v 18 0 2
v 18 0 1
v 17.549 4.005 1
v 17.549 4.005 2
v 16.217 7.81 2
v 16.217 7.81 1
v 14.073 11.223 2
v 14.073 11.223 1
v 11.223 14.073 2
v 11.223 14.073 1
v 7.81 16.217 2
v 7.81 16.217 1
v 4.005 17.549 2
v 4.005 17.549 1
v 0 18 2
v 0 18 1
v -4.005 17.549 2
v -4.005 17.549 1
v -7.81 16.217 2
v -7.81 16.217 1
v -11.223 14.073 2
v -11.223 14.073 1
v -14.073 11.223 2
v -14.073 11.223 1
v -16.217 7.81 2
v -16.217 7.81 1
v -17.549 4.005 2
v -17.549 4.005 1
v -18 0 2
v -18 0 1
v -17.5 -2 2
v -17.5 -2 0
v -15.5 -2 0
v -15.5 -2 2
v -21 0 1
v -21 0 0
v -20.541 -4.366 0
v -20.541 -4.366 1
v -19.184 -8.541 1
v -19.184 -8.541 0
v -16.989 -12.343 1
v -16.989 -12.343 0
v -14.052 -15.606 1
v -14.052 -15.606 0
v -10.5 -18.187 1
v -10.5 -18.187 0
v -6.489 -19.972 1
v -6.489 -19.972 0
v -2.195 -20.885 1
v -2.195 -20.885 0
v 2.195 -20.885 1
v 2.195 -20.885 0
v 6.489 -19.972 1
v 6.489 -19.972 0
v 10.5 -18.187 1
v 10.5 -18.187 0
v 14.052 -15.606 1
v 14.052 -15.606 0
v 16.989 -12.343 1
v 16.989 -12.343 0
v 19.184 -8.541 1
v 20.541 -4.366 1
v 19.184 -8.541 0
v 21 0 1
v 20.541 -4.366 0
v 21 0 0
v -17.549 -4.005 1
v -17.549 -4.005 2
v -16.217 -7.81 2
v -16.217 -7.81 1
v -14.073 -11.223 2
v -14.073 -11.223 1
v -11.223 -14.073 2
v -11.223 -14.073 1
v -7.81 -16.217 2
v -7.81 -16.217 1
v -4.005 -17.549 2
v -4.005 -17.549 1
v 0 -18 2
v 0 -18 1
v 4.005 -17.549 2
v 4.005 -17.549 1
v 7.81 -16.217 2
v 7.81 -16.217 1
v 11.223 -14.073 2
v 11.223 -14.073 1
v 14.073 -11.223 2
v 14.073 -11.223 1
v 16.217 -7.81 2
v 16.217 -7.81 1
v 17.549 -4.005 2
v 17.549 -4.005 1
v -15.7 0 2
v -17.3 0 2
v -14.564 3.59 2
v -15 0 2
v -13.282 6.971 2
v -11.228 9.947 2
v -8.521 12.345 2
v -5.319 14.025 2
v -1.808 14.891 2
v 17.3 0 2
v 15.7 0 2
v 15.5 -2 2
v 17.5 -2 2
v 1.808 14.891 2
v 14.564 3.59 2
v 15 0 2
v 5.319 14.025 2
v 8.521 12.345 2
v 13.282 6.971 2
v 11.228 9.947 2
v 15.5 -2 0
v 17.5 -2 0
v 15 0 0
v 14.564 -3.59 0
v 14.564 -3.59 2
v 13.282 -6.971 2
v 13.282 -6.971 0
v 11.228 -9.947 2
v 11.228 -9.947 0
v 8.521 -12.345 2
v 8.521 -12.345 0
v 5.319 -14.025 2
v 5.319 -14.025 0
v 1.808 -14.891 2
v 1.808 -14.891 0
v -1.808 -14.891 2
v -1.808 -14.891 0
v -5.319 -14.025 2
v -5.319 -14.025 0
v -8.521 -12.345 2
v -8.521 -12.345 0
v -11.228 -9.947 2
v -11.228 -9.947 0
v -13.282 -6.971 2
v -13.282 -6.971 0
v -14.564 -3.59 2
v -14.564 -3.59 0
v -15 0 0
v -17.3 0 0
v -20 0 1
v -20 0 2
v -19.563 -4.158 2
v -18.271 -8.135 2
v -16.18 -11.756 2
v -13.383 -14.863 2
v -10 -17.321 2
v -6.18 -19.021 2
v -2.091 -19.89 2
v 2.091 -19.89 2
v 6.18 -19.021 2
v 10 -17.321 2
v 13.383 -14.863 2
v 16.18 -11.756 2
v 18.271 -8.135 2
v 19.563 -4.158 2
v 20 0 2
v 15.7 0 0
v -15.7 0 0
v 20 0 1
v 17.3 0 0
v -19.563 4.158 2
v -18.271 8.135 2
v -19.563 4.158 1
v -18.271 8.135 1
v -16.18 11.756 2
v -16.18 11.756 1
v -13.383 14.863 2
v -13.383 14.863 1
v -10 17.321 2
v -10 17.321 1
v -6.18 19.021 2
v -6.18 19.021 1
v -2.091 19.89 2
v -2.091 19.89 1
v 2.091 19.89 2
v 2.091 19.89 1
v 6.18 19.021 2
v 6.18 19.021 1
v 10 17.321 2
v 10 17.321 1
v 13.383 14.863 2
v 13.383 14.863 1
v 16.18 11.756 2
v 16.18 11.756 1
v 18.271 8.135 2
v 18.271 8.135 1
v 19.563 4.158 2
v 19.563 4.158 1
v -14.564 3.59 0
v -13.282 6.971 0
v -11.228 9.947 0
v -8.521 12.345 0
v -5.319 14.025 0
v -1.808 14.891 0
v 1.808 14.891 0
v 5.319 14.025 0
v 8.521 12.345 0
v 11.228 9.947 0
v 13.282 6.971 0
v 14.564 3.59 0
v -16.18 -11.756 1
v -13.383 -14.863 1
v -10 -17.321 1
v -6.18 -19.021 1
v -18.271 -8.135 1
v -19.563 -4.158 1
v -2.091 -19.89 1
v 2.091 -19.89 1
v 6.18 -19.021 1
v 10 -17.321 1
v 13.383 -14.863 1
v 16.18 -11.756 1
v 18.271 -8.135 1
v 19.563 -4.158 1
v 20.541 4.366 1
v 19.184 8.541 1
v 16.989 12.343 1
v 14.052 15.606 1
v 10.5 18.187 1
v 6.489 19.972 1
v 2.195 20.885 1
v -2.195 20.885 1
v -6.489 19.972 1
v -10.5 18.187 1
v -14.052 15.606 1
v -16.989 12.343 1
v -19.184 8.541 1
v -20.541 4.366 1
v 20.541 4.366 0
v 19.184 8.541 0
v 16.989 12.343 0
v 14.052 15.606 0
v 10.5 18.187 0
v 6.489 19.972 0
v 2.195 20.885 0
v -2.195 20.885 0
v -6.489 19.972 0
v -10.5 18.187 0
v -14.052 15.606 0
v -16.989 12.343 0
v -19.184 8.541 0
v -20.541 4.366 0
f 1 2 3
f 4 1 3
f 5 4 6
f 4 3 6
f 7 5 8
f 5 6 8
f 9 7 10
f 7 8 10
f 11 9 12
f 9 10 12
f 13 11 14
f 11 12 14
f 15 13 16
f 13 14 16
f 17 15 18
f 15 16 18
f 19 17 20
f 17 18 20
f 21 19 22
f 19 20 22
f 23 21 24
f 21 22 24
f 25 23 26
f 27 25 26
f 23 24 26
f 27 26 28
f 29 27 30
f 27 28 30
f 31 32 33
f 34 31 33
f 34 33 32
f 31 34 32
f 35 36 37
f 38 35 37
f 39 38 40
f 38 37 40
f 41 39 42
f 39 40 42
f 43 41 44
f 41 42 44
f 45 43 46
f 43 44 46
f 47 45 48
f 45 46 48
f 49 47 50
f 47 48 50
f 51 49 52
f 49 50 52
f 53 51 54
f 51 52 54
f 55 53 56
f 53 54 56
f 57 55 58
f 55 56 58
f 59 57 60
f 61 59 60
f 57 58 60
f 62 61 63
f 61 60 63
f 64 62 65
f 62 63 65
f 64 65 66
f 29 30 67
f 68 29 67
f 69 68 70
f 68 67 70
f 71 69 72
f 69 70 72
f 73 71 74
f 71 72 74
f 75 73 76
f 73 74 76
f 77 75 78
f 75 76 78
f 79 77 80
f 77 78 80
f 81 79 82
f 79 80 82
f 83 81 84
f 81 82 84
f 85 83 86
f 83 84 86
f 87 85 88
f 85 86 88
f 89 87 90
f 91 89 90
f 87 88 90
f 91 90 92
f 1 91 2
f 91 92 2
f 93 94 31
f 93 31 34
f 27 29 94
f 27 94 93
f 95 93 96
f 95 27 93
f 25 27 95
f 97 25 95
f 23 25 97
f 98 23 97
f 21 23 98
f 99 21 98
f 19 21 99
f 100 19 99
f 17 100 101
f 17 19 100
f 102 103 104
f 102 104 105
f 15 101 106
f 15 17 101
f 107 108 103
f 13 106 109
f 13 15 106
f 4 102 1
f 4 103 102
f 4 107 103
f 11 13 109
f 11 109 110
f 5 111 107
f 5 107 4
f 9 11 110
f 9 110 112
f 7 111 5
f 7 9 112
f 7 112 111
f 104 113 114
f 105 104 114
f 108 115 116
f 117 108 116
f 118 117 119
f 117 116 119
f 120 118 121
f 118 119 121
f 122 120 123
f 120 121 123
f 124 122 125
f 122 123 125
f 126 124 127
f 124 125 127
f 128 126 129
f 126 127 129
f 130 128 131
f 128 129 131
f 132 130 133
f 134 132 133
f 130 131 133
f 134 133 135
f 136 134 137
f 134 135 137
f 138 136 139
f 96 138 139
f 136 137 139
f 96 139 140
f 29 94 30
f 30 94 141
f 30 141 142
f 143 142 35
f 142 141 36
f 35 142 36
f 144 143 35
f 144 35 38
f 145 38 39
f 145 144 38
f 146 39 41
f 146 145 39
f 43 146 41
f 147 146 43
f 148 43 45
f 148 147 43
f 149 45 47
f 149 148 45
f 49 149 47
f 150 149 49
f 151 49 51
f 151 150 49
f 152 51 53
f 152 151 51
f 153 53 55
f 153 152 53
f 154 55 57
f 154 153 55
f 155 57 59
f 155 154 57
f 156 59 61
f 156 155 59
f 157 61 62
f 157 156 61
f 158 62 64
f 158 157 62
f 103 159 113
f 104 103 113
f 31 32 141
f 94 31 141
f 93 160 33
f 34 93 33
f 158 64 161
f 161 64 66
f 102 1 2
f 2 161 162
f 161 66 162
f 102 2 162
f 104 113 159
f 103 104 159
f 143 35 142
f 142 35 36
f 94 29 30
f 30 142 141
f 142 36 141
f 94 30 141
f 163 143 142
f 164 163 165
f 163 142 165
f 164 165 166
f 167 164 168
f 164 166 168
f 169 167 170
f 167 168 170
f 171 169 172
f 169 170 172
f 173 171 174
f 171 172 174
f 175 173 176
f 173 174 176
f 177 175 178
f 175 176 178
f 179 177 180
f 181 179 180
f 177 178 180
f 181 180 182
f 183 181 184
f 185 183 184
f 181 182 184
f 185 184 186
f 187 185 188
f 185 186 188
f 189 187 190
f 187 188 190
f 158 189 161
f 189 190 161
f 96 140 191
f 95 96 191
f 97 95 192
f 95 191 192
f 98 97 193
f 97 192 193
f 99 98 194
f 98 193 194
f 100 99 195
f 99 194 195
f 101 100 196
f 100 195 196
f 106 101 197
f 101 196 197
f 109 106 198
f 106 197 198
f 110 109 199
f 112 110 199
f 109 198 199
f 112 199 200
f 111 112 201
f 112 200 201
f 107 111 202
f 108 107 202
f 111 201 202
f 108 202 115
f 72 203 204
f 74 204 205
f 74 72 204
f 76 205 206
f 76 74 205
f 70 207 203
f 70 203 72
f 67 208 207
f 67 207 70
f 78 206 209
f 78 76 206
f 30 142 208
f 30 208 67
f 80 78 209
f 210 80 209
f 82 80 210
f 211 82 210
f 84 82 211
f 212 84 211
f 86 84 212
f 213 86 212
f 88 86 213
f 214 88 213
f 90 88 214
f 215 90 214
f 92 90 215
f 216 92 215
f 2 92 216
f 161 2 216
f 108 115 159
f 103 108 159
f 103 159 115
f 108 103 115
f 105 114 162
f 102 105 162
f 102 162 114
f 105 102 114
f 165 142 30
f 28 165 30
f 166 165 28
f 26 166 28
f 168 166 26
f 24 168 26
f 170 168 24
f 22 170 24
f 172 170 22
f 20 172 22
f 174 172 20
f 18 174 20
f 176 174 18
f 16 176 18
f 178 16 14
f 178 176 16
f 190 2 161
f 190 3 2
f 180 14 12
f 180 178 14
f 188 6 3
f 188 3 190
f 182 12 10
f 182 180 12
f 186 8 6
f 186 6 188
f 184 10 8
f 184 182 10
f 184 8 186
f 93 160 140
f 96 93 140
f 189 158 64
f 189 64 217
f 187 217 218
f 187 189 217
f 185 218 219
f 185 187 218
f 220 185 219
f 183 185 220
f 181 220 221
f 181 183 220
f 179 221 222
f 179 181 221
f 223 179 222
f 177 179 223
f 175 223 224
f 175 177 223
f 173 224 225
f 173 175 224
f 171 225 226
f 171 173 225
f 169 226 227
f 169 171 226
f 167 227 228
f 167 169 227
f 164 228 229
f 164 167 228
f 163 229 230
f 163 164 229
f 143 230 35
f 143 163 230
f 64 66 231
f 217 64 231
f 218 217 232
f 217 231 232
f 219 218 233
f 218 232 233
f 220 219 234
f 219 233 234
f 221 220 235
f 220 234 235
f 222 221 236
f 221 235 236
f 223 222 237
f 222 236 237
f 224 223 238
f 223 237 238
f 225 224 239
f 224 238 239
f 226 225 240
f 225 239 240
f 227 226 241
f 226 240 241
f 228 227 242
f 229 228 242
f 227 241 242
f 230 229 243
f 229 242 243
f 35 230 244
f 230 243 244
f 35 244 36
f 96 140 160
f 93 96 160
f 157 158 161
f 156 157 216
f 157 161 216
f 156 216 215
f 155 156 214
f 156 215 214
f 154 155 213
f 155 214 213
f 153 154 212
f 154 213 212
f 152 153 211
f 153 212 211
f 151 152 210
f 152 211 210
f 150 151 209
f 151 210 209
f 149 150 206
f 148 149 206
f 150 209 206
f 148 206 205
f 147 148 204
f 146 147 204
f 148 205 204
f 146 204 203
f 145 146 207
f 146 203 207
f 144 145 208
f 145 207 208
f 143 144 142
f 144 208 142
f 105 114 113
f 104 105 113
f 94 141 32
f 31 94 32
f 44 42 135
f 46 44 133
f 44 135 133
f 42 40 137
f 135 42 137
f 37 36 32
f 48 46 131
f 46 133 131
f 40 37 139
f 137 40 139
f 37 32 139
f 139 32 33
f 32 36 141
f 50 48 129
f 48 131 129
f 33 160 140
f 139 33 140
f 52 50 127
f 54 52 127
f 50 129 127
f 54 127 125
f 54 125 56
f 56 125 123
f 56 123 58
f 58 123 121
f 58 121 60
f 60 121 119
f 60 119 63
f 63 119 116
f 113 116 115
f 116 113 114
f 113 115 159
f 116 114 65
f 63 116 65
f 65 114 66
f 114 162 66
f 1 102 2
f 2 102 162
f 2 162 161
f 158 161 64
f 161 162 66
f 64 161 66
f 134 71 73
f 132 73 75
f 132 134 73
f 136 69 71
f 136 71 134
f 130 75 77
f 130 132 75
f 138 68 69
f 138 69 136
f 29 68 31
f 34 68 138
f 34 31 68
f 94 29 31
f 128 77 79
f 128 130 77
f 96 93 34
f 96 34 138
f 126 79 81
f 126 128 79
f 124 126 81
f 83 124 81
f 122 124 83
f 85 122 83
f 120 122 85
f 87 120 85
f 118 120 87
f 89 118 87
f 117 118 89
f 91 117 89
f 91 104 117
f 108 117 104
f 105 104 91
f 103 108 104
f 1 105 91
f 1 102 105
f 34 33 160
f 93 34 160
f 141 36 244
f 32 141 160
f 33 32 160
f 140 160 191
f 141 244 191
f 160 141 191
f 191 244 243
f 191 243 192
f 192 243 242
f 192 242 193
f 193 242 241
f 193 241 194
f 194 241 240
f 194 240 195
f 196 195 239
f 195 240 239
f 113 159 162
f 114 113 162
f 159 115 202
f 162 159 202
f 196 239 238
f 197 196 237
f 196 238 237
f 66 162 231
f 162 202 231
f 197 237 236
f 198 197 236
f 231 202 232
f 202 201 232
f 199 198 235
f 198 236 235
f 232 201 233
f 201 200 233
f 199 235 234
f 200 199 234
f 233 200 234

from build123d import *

# Parameters (mm, degrees)
F1_DEPTH  = 2
F2_DEPTH  = 1
F3_DEPTH  = 2
F4_DEPTH  = 2
F5_DEPTH  = 1
F6_DEPTH  = 2
F7_SIZE   = 0.99999
F7_2_SIZE = 0.99999


# Not quite as in the source:
# - a fillet or chamfer is up to 0.001 mm smaller than in the source, because OpenCascade refuses the exact size


with BuildPart() as f1:
    # F0 (on Top) → F1 (new body)
    with BuildSketch(Plane.XY):
        with BuildLine():
            Line((20, 0), (21, 0))
            ThreePointArc((21, 0), (0, 21), (-21, 0))
            Line((-21, 0), (-20, 0))
            ThreePointArc((-20, 0), (0, 20), (20, 0))
        make_face()
    extrude(amount=F1_DEPTH)

    # F0 (on Top) → F2 (join)
    with BuildSketch(Plane.XY):
        with BuildLine():
            Line((18, 0), (20, 0))
            ThreePointArc((20, 0), (0, 20), (-20, 0))
            Line((-20, 0), (-18, 0))
            ThreePointArc((-18, 0), (0, 18), (18, 0))
        make_face()
    extrude(amount=F2_DEPTH)

    # F0 (on Top) → F3 (join)
    with BuildSketch(Plane.XY):
        with BuildLine():
            Line((17.3, 0), (18, 0))
            ThreePointArc((18, 0), (0, 18), (-18, 0))
            Line((-18, 0), (-17.3, 0))
            Line((-17.3, 0), (-17.5, -2))
            Line((-17.5, -2), (-16.5, -2))
            Line((-16.5, -2), (-15.5, -2))
            Line((-15.5, -2), (-15.7, 0))
            Line((-15.7, 0), (-15, 0))
            ThreePointArc((-15, 0), (0, 15), (15, 0))
            Line((15, 0), (15.7, 0))
            Line((15.7, 0), (15.5, -2))
            Line((15.5, -2), (16.5, -2))
            Line((16.5, -2), (17.5, -2))
            Line((17.5, -2), (17.3, 0))
        make_face()
    extrude(amount=F3_DEPTH)

    # F7 (size 1 in the source; OpenCascade refuses exactly that, so slightly less here)
    f7_edges = [f1.edges().sort_by_distance(p)[0] for p in [
        (0, 21, 2),
    ]]
    chamfer(f7_edges, length=F7_SIZE)


with BuildPart() as f4:
    # F0 (on Top) → F4 (new body)
    with BuildSketch(Plane.XY):
        with BuildLine():
            ThreePointArc((-18, 0), (0, -18), (18, 0))
            Line((18, 0), (17.3, 0))
            Line((17.3, 0), (17.5, -2))
            Line((17.5, -2), (16.5, -2))
            Line((16.5, -2), (15.5, -2))
            Line((15.5, -2), (15.7, 0))
            Line((15.7, 0), (15, 0))
            ThreePointArc((15, 0), (0, -15), (-15, 0))
            Line((-15, 0), (-15.7, 0))
            Line((-15.7, 0), (-15.5, -2))
            Line((-15.5, -2), (-16.5, -2))
            Line((-16.5, -2), (-17.5, -2))
            Line((-17.5, -2), (-17.3, 0))
            Line((-17.3, 0), (-18, 0))
        make_face()
    extrude(amount=F4_DEPTH)

    # F0 (on Top) → F5 (join)
    with BuildSketch(Plane.XY):
        with BuildLine():
            ThreePointArc((-20, 0), (0, -20), (20, 0))
            Line((20, 0), (18, 0))
            ThreePointArc((18, 0), (0, -18), (-18, 0))
            Line((-18, 0), (-20, 0))
        make_face()
    extrude(amount=F5_DEPTH)

    # F0 (on Top) → F6 (join)
    with BuildSketch(Plane.XY):
        with BuildLine():
            ThreePointArc((-21, 0), (0, -21), (21, 0))
            Line((21, 0), (20, 0))
            ThreePointArc((20, 0), (0, -20), (-20, 0))
            Line((-20, 0), (-21, 0))
        make_face()
    extrude(amount=F6_DEPTH)

    # F7#2 (size 1 in the source; OpenCascade refuses exactly that, so slightly less here)
    f7_2_edges = [f4.edges().sort_by_distance(p)[0] for p in [
        (0, -21, 2),
    ]]
    chamfer(f7_2_edges, length=F7_2_SIZE)


solid = Compound([f1.part, f4.part])
